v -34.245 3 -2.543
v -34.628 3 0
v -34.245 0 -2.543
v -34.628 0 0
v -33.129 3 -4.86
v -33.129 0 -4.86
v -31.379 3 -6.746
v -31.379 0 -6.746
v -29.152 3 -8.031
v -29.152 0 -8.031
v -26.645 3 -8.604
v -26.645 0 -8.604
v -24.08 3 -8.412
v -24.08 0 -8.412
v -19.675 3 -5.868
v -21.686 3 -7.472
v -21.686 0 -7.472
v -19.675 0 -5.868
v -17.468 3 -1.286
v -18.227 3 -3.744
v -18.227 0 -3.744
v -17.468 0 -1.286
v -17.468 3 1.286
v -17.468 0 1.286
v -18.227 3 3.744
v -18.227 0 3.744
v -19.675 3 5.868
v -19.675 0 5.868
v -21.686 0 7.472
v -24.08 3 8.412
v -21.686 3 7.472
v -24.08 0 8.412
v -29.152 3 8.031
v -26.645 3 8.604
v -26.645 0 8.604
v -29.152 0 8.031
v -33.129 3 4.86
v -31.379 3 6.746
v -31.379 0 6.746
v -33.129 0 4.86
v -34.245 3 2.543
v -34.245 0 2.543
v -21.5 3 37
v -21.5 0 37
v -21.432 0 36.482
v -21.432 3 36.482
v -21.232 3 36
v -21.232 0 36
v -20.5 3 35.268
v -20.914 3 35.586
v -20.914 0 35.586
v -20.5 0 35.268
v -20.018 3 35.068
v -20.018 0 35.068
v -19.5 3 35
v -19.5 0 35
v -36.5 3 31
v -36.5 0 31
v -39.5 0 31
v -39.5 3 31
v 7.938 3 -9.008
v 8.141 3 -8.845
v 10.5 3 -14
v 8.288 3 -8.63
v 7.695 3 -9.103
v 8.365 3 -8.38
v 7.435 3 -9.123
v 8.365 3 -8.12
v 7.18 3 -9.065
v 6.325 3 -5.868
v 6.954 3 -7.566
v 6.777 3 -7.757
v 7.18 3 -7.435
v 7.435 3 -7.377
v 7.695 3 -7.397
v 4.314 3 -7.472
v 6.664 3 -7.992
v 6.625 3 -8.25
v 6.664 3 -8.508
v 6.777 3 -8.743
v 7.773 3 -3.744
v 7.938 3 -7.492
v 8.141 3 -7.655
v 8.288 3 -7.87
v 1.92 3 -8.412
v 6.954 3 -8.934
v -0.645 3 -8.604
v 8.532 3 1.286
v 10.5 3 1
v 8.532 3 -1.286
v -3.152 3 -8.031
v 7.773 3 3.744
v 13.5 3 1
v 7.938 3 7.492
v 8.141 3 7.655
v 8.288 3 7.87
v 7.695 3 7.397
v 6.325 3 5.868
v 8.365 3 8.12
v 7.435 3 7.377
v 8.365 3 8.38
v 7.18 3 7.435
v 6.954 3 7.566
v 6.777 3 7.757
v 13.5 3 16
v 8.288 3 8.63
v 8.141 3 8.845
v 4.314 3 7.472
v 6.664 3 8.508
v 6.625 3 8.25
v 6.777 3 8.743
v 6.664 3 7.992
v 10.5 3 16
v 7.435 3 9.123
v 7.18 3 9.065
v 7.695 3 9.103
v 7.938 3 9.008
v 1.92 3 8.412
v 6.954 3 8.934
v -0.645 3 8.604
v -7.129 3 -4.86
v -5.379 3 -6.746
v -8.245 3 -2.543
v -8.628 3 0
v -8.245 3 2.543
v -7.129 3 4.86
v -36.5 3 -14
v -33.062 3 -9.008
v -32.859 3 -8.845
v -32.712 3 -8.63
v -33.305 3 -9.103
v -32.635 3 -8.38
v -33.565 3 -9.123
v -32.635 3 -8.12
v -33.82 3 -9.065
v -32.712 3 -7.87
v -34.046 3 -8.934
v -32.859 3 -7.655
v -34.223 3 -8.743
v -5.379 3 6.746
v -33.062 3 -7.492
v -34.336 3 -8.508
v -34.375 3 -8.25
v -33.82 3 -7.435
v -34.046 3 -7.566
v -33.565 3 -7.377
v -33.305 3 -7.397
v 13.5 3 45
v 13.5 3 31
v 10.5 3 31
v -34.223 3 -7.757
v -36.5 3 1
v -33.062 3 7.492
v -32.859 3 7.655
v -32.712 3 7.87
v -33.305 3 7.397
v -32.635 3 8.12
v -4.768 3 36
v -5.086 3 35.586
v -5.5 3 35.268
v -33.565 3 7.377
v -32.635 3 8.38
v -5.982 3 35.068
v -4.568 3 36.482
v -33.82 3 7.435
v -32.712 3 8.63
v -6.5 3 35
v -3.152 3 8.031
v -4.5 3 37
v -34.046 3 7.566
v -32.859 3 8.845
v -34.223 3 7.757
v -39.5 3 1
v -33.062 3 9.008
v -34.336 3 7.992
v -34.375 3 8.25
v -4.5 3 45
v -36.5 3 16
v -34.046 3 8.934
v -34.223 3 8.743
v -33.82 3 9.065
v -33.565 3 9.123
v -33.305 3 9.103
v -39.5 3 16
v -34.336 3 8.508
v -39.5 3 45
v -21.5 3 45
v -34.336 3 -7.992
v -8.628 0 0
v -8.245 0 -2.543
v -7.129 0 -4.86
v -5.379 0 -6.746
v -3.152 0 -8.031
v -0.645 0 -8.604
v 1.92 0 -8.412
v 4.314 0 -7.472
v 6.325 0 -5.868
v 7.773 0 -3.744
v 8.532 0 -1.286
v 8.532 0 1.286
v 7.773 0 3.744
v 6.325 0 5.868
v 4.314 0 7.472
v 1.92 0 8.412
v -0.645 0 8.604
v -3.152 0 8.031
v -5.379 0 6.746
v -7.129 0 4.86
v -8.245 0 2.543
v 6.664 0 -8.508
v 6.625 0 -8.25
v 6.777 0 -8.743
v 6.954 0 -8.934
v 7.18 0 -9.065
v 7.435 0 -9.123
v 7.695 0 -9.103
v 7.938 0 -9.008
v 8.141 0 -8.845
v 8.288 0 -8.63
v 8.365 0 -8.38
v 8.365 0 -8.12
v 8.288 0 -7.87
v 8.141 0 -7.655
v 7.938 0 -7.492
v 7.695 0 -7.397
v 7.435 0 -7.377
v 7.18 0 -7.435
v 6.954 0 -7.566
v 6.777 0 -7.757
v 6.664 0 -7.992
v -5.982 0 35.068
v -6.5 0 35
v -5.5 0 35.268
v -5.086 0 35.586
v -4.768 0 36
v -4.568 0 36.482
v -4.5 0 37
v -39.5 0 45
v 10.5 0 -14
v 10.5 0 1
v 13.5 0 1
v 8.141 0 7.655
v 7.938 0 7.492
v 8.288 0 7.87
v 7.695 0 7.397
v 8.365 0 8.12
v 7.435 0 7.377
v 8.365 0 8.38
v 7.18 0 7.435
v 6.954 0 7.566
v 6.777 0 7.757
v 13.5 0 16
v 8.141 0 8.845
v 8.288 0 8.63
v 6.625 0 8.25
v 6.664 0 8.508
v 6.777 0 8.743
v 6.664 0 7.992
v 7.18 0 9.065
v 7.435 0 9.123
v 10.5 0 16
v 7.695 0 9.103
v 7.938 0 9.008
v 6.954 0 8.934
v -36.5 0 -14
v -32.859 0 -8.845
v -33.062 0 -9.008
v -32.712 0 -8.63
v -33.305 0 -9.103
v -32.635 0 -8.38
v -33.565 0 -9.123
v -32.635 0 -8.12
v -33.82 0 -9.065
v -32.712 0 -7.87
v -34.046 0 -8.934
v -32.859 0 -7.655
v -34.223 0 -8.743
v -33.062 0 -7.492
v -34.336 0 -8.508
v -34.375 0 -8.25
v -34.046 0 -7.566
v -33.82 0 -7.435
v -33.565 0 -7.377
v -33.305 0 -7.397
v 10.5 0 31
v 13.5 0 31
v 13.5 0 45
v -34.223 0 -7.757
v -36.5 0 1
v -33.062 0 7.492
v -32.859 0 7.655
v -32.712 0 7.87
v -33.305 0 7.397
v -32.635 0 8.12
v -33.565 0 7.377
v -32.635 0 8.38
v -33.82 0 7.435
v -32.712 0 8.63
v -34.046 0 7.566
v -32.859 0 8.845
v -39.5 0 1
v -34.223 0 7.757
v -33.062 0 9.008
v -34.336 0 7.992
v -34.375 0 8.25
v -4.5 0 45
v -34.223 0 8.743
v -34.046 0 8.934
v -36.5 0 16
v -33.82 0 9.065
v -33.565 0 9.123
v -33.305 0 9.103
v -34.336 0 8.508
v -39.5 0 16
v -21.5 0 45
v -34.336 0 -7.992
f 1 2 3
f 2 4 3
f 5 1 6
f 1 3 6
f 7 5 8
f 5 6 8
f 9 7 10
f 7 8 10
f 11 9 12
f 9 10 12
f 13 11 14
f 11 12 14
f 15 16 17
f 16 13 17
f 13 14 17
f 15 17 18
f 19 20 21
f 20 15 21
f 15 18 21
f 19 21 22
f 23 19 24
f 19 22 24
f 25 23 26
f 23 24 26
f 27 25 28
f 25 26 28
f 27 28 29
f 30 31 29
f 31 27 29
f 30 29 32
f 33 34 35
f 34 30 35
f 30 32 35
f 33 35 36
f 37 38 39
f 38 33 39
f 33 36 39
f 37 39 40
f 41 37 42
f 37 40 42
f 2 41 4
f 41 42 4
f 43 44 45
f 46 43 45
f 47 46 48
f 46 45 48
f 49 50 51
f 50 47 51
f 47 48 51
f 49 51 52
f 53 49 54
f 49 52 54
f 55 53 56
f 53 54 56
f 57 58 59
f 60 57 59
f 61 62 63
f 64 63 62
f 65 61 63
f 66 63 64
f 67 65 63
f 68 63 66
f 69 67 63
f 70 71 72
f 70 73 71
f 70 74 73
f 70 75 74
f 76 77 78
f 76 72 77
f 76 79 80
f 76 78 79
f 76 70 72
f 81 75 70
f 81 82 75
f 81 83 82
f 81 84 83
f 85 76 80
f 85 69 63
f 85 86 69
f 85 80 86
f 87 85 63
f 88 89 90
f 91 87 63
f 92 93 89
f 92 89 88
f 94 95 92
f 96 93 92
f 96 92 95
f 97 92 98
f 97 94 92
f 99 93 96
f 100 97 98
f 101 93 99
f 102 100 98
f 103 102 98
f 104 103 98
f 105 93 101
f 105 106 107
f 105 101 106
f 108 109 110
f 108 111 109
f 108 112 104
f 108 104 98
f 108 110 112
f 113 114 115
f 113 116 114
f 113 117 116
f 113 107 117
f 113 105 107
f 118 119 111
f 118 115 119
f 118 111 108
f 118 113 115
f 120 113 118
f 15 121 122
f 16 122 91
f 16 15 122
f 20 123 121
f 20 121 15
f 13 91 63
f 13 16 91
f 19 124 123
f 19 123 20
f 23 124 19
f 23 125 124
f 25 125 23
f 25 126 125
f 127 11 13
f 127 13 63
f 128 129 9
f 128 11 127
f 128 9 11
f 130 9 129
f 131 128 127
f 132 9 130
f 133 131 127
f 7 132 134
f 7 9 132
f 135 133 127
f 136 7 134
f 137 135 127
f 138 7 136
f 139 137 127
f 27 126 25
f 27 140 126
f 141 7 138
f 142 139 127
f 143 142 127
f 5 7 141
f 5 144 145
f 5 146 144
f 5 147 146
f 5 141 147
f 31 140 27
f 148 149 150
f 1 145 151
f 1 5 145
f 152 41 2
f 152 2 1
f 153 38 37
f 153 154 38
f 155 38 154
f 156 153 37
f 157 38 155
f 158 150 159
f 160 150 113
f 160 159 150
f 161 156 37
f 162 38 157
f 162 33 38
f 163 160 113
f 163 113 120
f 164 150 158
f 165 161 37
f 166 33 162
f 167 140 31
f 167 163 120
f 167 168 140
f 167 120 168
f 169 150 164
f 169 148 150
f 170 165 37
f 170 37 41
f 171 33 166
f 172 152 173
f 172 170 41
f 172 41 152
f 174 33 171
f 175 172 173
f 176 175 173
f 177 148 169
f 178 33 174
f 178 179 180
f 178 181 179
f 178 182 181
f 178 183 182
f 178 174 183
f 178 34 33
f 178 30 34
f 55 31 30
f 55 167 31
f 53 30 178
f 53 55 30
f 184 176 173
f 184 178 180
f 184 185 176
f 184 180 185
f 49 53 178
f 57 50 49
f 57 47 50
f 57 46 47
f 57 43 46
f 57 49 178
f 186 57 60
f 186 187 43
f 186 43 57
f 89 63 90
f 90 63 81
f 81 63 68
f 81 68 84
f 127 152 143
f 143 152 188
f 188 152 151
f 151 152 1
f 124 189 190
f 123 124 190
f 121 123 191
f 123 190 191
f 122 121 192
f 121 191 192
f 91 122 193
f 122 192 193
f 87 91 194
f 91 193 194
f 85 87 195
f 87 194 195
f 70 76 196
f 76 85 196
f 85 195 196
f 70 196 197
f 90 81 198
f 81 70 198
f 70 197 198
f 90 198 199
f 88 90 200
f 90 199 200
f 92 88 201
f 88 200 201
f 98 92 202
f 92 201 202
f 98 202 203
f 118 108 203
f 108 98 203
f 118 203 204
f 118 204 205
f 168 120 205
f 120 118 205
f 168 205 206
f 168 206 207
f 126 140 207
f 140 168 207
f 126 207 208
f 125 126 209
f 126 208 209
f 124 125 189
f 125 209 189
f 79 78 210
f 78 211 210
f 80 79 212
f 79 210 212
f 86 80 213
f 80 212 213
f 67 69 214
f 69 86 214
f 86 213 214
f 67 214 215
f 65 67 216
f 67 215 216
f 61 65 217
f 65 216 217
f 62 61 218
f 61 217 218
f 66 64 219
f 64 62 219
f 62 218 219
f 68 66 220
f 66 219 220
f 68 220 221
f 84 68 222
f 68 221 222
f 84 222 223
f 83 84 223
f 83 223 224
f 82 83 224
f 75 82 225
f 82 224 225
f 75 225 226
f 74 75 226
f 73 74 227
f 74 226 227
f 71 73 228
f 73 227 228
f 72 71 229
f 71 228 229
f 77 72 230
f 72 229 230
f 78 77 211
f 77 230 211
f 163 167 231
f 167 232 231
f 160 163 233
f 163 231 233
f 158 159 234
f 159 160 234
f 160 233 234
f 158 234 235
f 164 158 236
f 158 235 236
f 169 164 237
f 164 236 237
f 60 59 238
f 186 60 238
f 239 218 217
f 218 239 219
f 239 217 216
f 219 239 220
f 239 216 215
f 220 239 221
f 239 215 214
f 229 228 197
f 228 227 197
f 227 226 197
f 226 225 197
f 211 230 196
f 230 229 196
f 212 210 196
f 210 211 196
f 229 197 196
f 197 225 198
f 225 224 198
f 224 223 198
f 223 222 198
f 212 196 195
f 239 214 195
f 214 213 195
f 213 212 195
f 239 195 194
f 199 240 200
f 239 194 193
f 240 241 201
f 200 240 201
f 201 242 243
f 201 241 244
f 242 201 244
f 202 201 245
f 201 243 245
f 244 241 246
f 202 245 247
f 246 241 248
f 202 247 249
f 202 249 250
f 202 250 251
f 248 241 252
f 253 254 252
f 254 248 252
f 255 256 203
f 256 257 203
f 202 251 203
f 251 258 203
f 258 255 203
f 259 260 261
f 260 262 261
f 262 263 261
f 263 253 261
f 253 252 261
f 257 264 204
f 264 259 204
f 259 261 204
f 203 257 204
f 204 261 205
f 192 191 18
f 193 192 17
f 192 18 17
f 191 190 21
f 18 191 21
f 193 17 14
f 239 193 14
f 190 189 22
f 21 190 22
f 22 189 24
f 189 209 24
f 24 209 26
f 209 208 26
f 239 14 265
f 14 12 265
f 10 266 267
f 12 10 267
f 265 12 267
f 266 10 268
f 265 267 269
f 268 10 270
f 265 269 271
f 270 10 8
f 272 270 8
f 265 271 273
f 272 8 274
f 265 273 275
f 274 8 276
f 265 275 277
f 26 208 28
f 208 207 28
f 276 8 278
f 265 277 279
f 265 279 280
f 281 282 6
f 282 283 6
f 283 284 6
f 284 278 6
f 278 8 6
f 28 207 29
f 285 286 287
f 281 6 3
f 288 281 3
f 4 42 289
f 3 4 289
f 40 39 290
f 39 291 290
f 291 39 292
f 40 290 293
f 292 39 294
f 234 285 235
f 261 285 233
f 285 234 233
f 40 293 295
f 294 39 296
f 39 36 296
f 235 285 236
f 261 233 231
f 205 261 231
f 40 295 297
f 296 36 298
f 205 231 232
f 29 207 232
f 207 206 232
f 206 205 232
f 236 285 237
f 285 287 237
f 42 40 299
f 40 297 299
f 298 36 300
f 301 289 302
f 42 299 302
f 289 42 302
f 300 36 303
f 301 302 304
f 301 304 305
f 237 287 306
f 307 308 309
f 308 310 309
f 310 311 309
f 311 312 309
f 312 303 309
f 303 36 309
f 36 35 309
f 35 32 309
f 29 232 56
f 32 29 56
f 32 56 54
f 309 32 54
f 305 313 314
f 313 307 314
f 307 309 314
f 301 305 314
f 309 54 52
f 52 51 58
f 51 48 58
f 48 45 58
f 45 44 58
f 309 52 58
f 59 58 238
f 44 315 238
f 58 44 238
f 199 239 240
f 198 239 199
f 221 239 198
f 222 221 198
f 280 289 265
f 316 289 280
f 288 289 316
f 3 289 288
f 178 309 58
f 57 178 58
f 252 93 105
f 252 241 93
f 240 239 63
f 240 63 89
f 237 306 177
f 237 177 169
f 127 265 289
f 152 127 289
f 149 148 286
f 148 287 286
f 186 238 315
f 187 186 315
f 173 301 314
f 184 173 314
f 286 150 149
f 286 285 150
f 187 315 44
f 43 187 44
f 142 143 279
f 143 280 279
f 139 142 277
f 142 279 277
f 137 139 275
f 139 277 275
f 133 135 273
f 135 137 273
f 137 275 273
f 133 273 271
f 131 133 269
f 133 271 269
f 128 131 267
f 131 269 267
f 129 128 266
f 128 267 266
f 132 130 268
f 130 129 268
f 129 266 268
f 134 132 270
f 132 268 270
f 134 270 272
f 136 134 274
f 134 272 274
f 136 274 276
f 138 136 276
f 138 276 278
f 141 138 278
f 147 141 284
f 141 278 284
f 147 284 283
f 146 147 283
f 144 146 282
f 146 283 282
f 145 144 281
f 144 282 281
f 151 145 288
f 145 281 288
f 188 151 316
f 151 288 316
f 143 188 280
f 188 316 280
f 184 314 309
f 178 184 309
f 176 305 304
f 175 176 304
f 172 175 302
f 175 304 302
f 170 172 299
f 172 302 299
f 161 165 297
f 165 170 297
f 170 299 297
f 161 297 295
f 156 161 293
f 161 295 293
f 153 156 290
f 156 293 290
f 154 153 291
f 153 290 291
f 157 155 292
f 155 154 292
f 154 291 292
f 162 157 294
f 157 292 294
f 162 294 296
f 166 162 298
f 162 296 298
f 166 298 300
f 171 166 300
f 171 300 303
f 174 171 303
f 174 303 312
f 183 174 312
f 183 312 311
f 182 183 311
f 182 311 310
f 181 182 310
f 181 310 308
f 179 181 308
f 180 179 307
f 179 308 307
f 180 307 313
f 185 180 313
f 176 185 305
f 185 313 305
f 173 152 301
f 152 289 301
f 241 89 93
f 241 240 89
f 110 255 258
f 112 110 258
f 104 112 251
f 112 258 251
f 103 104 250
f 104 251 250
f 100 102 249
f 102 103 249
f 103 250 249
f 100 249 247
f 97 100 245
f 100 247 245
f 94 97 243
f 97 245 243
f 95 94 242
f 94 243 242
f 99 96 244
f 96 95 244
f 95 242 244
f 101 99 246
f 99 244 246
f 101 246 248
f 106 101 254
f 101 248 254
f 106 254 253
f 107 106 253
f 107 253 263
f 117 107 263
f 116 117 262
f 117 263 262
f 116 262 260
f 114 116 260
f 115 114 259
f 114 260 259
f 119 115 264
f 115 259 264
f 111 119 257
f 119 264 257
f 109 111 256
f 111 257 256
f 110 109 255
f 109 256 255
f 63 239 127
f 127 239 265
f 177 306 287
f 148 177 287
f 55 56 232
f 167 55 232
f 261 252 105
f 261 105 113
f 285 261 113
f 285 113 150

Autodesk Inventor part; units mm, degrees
ref_plane "YZ Plane" through (0, 0, 0) normal (1, 0, 0) x (0, 1, 0)
ref_plane "XZ Plane" through (0, 0, 0) normal (0, 1, 0) x (-1, 0, 0)
ref_plane "XY Plane" through (0, 0, 0) normal (0, 0, 1) x (1, 0, 0)
sketch "Sketch1" plane through (0, 0, 0) normal (0, 1, 0) x (-1, 0, 0)
  circle A0 centre (-7.5, 8.25) radius 0.875
  circle A1 centre (-7.5, -8.25) radius 0.875
  circle A2 centre (33.5, 8.25) radius 0.875
  circle A3 centre (33.5, -8.25) radius 0.875
  circle A4 centre (0, 0) radius 8.6279
  circle A5 centre (26, 0) radius 8.6279
  line L0 (-13.5, -14) -> (36.5, -14)
  line L1 (39.5, 45) -> (21.5, 45)
  line L2 (21.5, 45) -> (21.5, 37)
  line L3 (4.5, 45) -> (4.5, 37)
  line L4 (19.5, 35) -> (6.5, 35)
  line L5 (39.5, 45) -> (21.5, 45)
  line L6 (4.5, 45) -> (-13.5, 45)
  line L7 (-13.5, 45) -> (39.285, 45) construction
  arc A6 (19.5, 35) -> (21.5, 37) centre (19.5, 37) ccw
  arc A7 (4.5, 37) -> (6.5, 35) centre (6.5, 37) ccw
  line L8 (-10.5, -14) -> (-10.5, 1)
  line L9 (-10.5, 1) -> (-13.5, 1)
  line L10 (-13.5, 1) -> (-13.5, 16)
  line L11 (-13.5, 16) -> (-10.5, 16)
  line L12 (-10.5, 16) -> (-10.5, 31)
  line L13 (-10.5, 31) -> (-13.5, 31)
  line L14 (-13.5, 45) -> (-13.5, 31)
  line L15 (-13.5, 16) -> (-13.5, 1)
  line L16 (36.5, -14) -> (36.5, 1)
  line L17 (36.5, 1) -> (39.5, 1)
  line L18 (39.5, 16) -> (36.5, 16)
  line L19 (36.5, 16) -> (36.5, 31)
  line L20 (36.5, 31) -> (39.5, 31)
  line L21 (39.5, 1) -> (39.5, 16)
  line L22 (39.5, 31) -> (39.5, 45)
  point P0 (35.5, -10)
  point P1 (21.5, 35)
  dimension "d5" = 1.75
  dimension "d6" = 1.75
  dimension "d7" = 1.75
  dimension "d8" = 1.75
  dimension "d11" = 18
  dimension "d12" = 10
  dimension "d14" = 2
  dimension "d15" = 3
  dimension "d17" = 15
  dimension "d18" = 15
extrude "Extrusion1" add sketch "Sketch1" along normal blind 3
properties part number "do_sensor_1_3mm"
